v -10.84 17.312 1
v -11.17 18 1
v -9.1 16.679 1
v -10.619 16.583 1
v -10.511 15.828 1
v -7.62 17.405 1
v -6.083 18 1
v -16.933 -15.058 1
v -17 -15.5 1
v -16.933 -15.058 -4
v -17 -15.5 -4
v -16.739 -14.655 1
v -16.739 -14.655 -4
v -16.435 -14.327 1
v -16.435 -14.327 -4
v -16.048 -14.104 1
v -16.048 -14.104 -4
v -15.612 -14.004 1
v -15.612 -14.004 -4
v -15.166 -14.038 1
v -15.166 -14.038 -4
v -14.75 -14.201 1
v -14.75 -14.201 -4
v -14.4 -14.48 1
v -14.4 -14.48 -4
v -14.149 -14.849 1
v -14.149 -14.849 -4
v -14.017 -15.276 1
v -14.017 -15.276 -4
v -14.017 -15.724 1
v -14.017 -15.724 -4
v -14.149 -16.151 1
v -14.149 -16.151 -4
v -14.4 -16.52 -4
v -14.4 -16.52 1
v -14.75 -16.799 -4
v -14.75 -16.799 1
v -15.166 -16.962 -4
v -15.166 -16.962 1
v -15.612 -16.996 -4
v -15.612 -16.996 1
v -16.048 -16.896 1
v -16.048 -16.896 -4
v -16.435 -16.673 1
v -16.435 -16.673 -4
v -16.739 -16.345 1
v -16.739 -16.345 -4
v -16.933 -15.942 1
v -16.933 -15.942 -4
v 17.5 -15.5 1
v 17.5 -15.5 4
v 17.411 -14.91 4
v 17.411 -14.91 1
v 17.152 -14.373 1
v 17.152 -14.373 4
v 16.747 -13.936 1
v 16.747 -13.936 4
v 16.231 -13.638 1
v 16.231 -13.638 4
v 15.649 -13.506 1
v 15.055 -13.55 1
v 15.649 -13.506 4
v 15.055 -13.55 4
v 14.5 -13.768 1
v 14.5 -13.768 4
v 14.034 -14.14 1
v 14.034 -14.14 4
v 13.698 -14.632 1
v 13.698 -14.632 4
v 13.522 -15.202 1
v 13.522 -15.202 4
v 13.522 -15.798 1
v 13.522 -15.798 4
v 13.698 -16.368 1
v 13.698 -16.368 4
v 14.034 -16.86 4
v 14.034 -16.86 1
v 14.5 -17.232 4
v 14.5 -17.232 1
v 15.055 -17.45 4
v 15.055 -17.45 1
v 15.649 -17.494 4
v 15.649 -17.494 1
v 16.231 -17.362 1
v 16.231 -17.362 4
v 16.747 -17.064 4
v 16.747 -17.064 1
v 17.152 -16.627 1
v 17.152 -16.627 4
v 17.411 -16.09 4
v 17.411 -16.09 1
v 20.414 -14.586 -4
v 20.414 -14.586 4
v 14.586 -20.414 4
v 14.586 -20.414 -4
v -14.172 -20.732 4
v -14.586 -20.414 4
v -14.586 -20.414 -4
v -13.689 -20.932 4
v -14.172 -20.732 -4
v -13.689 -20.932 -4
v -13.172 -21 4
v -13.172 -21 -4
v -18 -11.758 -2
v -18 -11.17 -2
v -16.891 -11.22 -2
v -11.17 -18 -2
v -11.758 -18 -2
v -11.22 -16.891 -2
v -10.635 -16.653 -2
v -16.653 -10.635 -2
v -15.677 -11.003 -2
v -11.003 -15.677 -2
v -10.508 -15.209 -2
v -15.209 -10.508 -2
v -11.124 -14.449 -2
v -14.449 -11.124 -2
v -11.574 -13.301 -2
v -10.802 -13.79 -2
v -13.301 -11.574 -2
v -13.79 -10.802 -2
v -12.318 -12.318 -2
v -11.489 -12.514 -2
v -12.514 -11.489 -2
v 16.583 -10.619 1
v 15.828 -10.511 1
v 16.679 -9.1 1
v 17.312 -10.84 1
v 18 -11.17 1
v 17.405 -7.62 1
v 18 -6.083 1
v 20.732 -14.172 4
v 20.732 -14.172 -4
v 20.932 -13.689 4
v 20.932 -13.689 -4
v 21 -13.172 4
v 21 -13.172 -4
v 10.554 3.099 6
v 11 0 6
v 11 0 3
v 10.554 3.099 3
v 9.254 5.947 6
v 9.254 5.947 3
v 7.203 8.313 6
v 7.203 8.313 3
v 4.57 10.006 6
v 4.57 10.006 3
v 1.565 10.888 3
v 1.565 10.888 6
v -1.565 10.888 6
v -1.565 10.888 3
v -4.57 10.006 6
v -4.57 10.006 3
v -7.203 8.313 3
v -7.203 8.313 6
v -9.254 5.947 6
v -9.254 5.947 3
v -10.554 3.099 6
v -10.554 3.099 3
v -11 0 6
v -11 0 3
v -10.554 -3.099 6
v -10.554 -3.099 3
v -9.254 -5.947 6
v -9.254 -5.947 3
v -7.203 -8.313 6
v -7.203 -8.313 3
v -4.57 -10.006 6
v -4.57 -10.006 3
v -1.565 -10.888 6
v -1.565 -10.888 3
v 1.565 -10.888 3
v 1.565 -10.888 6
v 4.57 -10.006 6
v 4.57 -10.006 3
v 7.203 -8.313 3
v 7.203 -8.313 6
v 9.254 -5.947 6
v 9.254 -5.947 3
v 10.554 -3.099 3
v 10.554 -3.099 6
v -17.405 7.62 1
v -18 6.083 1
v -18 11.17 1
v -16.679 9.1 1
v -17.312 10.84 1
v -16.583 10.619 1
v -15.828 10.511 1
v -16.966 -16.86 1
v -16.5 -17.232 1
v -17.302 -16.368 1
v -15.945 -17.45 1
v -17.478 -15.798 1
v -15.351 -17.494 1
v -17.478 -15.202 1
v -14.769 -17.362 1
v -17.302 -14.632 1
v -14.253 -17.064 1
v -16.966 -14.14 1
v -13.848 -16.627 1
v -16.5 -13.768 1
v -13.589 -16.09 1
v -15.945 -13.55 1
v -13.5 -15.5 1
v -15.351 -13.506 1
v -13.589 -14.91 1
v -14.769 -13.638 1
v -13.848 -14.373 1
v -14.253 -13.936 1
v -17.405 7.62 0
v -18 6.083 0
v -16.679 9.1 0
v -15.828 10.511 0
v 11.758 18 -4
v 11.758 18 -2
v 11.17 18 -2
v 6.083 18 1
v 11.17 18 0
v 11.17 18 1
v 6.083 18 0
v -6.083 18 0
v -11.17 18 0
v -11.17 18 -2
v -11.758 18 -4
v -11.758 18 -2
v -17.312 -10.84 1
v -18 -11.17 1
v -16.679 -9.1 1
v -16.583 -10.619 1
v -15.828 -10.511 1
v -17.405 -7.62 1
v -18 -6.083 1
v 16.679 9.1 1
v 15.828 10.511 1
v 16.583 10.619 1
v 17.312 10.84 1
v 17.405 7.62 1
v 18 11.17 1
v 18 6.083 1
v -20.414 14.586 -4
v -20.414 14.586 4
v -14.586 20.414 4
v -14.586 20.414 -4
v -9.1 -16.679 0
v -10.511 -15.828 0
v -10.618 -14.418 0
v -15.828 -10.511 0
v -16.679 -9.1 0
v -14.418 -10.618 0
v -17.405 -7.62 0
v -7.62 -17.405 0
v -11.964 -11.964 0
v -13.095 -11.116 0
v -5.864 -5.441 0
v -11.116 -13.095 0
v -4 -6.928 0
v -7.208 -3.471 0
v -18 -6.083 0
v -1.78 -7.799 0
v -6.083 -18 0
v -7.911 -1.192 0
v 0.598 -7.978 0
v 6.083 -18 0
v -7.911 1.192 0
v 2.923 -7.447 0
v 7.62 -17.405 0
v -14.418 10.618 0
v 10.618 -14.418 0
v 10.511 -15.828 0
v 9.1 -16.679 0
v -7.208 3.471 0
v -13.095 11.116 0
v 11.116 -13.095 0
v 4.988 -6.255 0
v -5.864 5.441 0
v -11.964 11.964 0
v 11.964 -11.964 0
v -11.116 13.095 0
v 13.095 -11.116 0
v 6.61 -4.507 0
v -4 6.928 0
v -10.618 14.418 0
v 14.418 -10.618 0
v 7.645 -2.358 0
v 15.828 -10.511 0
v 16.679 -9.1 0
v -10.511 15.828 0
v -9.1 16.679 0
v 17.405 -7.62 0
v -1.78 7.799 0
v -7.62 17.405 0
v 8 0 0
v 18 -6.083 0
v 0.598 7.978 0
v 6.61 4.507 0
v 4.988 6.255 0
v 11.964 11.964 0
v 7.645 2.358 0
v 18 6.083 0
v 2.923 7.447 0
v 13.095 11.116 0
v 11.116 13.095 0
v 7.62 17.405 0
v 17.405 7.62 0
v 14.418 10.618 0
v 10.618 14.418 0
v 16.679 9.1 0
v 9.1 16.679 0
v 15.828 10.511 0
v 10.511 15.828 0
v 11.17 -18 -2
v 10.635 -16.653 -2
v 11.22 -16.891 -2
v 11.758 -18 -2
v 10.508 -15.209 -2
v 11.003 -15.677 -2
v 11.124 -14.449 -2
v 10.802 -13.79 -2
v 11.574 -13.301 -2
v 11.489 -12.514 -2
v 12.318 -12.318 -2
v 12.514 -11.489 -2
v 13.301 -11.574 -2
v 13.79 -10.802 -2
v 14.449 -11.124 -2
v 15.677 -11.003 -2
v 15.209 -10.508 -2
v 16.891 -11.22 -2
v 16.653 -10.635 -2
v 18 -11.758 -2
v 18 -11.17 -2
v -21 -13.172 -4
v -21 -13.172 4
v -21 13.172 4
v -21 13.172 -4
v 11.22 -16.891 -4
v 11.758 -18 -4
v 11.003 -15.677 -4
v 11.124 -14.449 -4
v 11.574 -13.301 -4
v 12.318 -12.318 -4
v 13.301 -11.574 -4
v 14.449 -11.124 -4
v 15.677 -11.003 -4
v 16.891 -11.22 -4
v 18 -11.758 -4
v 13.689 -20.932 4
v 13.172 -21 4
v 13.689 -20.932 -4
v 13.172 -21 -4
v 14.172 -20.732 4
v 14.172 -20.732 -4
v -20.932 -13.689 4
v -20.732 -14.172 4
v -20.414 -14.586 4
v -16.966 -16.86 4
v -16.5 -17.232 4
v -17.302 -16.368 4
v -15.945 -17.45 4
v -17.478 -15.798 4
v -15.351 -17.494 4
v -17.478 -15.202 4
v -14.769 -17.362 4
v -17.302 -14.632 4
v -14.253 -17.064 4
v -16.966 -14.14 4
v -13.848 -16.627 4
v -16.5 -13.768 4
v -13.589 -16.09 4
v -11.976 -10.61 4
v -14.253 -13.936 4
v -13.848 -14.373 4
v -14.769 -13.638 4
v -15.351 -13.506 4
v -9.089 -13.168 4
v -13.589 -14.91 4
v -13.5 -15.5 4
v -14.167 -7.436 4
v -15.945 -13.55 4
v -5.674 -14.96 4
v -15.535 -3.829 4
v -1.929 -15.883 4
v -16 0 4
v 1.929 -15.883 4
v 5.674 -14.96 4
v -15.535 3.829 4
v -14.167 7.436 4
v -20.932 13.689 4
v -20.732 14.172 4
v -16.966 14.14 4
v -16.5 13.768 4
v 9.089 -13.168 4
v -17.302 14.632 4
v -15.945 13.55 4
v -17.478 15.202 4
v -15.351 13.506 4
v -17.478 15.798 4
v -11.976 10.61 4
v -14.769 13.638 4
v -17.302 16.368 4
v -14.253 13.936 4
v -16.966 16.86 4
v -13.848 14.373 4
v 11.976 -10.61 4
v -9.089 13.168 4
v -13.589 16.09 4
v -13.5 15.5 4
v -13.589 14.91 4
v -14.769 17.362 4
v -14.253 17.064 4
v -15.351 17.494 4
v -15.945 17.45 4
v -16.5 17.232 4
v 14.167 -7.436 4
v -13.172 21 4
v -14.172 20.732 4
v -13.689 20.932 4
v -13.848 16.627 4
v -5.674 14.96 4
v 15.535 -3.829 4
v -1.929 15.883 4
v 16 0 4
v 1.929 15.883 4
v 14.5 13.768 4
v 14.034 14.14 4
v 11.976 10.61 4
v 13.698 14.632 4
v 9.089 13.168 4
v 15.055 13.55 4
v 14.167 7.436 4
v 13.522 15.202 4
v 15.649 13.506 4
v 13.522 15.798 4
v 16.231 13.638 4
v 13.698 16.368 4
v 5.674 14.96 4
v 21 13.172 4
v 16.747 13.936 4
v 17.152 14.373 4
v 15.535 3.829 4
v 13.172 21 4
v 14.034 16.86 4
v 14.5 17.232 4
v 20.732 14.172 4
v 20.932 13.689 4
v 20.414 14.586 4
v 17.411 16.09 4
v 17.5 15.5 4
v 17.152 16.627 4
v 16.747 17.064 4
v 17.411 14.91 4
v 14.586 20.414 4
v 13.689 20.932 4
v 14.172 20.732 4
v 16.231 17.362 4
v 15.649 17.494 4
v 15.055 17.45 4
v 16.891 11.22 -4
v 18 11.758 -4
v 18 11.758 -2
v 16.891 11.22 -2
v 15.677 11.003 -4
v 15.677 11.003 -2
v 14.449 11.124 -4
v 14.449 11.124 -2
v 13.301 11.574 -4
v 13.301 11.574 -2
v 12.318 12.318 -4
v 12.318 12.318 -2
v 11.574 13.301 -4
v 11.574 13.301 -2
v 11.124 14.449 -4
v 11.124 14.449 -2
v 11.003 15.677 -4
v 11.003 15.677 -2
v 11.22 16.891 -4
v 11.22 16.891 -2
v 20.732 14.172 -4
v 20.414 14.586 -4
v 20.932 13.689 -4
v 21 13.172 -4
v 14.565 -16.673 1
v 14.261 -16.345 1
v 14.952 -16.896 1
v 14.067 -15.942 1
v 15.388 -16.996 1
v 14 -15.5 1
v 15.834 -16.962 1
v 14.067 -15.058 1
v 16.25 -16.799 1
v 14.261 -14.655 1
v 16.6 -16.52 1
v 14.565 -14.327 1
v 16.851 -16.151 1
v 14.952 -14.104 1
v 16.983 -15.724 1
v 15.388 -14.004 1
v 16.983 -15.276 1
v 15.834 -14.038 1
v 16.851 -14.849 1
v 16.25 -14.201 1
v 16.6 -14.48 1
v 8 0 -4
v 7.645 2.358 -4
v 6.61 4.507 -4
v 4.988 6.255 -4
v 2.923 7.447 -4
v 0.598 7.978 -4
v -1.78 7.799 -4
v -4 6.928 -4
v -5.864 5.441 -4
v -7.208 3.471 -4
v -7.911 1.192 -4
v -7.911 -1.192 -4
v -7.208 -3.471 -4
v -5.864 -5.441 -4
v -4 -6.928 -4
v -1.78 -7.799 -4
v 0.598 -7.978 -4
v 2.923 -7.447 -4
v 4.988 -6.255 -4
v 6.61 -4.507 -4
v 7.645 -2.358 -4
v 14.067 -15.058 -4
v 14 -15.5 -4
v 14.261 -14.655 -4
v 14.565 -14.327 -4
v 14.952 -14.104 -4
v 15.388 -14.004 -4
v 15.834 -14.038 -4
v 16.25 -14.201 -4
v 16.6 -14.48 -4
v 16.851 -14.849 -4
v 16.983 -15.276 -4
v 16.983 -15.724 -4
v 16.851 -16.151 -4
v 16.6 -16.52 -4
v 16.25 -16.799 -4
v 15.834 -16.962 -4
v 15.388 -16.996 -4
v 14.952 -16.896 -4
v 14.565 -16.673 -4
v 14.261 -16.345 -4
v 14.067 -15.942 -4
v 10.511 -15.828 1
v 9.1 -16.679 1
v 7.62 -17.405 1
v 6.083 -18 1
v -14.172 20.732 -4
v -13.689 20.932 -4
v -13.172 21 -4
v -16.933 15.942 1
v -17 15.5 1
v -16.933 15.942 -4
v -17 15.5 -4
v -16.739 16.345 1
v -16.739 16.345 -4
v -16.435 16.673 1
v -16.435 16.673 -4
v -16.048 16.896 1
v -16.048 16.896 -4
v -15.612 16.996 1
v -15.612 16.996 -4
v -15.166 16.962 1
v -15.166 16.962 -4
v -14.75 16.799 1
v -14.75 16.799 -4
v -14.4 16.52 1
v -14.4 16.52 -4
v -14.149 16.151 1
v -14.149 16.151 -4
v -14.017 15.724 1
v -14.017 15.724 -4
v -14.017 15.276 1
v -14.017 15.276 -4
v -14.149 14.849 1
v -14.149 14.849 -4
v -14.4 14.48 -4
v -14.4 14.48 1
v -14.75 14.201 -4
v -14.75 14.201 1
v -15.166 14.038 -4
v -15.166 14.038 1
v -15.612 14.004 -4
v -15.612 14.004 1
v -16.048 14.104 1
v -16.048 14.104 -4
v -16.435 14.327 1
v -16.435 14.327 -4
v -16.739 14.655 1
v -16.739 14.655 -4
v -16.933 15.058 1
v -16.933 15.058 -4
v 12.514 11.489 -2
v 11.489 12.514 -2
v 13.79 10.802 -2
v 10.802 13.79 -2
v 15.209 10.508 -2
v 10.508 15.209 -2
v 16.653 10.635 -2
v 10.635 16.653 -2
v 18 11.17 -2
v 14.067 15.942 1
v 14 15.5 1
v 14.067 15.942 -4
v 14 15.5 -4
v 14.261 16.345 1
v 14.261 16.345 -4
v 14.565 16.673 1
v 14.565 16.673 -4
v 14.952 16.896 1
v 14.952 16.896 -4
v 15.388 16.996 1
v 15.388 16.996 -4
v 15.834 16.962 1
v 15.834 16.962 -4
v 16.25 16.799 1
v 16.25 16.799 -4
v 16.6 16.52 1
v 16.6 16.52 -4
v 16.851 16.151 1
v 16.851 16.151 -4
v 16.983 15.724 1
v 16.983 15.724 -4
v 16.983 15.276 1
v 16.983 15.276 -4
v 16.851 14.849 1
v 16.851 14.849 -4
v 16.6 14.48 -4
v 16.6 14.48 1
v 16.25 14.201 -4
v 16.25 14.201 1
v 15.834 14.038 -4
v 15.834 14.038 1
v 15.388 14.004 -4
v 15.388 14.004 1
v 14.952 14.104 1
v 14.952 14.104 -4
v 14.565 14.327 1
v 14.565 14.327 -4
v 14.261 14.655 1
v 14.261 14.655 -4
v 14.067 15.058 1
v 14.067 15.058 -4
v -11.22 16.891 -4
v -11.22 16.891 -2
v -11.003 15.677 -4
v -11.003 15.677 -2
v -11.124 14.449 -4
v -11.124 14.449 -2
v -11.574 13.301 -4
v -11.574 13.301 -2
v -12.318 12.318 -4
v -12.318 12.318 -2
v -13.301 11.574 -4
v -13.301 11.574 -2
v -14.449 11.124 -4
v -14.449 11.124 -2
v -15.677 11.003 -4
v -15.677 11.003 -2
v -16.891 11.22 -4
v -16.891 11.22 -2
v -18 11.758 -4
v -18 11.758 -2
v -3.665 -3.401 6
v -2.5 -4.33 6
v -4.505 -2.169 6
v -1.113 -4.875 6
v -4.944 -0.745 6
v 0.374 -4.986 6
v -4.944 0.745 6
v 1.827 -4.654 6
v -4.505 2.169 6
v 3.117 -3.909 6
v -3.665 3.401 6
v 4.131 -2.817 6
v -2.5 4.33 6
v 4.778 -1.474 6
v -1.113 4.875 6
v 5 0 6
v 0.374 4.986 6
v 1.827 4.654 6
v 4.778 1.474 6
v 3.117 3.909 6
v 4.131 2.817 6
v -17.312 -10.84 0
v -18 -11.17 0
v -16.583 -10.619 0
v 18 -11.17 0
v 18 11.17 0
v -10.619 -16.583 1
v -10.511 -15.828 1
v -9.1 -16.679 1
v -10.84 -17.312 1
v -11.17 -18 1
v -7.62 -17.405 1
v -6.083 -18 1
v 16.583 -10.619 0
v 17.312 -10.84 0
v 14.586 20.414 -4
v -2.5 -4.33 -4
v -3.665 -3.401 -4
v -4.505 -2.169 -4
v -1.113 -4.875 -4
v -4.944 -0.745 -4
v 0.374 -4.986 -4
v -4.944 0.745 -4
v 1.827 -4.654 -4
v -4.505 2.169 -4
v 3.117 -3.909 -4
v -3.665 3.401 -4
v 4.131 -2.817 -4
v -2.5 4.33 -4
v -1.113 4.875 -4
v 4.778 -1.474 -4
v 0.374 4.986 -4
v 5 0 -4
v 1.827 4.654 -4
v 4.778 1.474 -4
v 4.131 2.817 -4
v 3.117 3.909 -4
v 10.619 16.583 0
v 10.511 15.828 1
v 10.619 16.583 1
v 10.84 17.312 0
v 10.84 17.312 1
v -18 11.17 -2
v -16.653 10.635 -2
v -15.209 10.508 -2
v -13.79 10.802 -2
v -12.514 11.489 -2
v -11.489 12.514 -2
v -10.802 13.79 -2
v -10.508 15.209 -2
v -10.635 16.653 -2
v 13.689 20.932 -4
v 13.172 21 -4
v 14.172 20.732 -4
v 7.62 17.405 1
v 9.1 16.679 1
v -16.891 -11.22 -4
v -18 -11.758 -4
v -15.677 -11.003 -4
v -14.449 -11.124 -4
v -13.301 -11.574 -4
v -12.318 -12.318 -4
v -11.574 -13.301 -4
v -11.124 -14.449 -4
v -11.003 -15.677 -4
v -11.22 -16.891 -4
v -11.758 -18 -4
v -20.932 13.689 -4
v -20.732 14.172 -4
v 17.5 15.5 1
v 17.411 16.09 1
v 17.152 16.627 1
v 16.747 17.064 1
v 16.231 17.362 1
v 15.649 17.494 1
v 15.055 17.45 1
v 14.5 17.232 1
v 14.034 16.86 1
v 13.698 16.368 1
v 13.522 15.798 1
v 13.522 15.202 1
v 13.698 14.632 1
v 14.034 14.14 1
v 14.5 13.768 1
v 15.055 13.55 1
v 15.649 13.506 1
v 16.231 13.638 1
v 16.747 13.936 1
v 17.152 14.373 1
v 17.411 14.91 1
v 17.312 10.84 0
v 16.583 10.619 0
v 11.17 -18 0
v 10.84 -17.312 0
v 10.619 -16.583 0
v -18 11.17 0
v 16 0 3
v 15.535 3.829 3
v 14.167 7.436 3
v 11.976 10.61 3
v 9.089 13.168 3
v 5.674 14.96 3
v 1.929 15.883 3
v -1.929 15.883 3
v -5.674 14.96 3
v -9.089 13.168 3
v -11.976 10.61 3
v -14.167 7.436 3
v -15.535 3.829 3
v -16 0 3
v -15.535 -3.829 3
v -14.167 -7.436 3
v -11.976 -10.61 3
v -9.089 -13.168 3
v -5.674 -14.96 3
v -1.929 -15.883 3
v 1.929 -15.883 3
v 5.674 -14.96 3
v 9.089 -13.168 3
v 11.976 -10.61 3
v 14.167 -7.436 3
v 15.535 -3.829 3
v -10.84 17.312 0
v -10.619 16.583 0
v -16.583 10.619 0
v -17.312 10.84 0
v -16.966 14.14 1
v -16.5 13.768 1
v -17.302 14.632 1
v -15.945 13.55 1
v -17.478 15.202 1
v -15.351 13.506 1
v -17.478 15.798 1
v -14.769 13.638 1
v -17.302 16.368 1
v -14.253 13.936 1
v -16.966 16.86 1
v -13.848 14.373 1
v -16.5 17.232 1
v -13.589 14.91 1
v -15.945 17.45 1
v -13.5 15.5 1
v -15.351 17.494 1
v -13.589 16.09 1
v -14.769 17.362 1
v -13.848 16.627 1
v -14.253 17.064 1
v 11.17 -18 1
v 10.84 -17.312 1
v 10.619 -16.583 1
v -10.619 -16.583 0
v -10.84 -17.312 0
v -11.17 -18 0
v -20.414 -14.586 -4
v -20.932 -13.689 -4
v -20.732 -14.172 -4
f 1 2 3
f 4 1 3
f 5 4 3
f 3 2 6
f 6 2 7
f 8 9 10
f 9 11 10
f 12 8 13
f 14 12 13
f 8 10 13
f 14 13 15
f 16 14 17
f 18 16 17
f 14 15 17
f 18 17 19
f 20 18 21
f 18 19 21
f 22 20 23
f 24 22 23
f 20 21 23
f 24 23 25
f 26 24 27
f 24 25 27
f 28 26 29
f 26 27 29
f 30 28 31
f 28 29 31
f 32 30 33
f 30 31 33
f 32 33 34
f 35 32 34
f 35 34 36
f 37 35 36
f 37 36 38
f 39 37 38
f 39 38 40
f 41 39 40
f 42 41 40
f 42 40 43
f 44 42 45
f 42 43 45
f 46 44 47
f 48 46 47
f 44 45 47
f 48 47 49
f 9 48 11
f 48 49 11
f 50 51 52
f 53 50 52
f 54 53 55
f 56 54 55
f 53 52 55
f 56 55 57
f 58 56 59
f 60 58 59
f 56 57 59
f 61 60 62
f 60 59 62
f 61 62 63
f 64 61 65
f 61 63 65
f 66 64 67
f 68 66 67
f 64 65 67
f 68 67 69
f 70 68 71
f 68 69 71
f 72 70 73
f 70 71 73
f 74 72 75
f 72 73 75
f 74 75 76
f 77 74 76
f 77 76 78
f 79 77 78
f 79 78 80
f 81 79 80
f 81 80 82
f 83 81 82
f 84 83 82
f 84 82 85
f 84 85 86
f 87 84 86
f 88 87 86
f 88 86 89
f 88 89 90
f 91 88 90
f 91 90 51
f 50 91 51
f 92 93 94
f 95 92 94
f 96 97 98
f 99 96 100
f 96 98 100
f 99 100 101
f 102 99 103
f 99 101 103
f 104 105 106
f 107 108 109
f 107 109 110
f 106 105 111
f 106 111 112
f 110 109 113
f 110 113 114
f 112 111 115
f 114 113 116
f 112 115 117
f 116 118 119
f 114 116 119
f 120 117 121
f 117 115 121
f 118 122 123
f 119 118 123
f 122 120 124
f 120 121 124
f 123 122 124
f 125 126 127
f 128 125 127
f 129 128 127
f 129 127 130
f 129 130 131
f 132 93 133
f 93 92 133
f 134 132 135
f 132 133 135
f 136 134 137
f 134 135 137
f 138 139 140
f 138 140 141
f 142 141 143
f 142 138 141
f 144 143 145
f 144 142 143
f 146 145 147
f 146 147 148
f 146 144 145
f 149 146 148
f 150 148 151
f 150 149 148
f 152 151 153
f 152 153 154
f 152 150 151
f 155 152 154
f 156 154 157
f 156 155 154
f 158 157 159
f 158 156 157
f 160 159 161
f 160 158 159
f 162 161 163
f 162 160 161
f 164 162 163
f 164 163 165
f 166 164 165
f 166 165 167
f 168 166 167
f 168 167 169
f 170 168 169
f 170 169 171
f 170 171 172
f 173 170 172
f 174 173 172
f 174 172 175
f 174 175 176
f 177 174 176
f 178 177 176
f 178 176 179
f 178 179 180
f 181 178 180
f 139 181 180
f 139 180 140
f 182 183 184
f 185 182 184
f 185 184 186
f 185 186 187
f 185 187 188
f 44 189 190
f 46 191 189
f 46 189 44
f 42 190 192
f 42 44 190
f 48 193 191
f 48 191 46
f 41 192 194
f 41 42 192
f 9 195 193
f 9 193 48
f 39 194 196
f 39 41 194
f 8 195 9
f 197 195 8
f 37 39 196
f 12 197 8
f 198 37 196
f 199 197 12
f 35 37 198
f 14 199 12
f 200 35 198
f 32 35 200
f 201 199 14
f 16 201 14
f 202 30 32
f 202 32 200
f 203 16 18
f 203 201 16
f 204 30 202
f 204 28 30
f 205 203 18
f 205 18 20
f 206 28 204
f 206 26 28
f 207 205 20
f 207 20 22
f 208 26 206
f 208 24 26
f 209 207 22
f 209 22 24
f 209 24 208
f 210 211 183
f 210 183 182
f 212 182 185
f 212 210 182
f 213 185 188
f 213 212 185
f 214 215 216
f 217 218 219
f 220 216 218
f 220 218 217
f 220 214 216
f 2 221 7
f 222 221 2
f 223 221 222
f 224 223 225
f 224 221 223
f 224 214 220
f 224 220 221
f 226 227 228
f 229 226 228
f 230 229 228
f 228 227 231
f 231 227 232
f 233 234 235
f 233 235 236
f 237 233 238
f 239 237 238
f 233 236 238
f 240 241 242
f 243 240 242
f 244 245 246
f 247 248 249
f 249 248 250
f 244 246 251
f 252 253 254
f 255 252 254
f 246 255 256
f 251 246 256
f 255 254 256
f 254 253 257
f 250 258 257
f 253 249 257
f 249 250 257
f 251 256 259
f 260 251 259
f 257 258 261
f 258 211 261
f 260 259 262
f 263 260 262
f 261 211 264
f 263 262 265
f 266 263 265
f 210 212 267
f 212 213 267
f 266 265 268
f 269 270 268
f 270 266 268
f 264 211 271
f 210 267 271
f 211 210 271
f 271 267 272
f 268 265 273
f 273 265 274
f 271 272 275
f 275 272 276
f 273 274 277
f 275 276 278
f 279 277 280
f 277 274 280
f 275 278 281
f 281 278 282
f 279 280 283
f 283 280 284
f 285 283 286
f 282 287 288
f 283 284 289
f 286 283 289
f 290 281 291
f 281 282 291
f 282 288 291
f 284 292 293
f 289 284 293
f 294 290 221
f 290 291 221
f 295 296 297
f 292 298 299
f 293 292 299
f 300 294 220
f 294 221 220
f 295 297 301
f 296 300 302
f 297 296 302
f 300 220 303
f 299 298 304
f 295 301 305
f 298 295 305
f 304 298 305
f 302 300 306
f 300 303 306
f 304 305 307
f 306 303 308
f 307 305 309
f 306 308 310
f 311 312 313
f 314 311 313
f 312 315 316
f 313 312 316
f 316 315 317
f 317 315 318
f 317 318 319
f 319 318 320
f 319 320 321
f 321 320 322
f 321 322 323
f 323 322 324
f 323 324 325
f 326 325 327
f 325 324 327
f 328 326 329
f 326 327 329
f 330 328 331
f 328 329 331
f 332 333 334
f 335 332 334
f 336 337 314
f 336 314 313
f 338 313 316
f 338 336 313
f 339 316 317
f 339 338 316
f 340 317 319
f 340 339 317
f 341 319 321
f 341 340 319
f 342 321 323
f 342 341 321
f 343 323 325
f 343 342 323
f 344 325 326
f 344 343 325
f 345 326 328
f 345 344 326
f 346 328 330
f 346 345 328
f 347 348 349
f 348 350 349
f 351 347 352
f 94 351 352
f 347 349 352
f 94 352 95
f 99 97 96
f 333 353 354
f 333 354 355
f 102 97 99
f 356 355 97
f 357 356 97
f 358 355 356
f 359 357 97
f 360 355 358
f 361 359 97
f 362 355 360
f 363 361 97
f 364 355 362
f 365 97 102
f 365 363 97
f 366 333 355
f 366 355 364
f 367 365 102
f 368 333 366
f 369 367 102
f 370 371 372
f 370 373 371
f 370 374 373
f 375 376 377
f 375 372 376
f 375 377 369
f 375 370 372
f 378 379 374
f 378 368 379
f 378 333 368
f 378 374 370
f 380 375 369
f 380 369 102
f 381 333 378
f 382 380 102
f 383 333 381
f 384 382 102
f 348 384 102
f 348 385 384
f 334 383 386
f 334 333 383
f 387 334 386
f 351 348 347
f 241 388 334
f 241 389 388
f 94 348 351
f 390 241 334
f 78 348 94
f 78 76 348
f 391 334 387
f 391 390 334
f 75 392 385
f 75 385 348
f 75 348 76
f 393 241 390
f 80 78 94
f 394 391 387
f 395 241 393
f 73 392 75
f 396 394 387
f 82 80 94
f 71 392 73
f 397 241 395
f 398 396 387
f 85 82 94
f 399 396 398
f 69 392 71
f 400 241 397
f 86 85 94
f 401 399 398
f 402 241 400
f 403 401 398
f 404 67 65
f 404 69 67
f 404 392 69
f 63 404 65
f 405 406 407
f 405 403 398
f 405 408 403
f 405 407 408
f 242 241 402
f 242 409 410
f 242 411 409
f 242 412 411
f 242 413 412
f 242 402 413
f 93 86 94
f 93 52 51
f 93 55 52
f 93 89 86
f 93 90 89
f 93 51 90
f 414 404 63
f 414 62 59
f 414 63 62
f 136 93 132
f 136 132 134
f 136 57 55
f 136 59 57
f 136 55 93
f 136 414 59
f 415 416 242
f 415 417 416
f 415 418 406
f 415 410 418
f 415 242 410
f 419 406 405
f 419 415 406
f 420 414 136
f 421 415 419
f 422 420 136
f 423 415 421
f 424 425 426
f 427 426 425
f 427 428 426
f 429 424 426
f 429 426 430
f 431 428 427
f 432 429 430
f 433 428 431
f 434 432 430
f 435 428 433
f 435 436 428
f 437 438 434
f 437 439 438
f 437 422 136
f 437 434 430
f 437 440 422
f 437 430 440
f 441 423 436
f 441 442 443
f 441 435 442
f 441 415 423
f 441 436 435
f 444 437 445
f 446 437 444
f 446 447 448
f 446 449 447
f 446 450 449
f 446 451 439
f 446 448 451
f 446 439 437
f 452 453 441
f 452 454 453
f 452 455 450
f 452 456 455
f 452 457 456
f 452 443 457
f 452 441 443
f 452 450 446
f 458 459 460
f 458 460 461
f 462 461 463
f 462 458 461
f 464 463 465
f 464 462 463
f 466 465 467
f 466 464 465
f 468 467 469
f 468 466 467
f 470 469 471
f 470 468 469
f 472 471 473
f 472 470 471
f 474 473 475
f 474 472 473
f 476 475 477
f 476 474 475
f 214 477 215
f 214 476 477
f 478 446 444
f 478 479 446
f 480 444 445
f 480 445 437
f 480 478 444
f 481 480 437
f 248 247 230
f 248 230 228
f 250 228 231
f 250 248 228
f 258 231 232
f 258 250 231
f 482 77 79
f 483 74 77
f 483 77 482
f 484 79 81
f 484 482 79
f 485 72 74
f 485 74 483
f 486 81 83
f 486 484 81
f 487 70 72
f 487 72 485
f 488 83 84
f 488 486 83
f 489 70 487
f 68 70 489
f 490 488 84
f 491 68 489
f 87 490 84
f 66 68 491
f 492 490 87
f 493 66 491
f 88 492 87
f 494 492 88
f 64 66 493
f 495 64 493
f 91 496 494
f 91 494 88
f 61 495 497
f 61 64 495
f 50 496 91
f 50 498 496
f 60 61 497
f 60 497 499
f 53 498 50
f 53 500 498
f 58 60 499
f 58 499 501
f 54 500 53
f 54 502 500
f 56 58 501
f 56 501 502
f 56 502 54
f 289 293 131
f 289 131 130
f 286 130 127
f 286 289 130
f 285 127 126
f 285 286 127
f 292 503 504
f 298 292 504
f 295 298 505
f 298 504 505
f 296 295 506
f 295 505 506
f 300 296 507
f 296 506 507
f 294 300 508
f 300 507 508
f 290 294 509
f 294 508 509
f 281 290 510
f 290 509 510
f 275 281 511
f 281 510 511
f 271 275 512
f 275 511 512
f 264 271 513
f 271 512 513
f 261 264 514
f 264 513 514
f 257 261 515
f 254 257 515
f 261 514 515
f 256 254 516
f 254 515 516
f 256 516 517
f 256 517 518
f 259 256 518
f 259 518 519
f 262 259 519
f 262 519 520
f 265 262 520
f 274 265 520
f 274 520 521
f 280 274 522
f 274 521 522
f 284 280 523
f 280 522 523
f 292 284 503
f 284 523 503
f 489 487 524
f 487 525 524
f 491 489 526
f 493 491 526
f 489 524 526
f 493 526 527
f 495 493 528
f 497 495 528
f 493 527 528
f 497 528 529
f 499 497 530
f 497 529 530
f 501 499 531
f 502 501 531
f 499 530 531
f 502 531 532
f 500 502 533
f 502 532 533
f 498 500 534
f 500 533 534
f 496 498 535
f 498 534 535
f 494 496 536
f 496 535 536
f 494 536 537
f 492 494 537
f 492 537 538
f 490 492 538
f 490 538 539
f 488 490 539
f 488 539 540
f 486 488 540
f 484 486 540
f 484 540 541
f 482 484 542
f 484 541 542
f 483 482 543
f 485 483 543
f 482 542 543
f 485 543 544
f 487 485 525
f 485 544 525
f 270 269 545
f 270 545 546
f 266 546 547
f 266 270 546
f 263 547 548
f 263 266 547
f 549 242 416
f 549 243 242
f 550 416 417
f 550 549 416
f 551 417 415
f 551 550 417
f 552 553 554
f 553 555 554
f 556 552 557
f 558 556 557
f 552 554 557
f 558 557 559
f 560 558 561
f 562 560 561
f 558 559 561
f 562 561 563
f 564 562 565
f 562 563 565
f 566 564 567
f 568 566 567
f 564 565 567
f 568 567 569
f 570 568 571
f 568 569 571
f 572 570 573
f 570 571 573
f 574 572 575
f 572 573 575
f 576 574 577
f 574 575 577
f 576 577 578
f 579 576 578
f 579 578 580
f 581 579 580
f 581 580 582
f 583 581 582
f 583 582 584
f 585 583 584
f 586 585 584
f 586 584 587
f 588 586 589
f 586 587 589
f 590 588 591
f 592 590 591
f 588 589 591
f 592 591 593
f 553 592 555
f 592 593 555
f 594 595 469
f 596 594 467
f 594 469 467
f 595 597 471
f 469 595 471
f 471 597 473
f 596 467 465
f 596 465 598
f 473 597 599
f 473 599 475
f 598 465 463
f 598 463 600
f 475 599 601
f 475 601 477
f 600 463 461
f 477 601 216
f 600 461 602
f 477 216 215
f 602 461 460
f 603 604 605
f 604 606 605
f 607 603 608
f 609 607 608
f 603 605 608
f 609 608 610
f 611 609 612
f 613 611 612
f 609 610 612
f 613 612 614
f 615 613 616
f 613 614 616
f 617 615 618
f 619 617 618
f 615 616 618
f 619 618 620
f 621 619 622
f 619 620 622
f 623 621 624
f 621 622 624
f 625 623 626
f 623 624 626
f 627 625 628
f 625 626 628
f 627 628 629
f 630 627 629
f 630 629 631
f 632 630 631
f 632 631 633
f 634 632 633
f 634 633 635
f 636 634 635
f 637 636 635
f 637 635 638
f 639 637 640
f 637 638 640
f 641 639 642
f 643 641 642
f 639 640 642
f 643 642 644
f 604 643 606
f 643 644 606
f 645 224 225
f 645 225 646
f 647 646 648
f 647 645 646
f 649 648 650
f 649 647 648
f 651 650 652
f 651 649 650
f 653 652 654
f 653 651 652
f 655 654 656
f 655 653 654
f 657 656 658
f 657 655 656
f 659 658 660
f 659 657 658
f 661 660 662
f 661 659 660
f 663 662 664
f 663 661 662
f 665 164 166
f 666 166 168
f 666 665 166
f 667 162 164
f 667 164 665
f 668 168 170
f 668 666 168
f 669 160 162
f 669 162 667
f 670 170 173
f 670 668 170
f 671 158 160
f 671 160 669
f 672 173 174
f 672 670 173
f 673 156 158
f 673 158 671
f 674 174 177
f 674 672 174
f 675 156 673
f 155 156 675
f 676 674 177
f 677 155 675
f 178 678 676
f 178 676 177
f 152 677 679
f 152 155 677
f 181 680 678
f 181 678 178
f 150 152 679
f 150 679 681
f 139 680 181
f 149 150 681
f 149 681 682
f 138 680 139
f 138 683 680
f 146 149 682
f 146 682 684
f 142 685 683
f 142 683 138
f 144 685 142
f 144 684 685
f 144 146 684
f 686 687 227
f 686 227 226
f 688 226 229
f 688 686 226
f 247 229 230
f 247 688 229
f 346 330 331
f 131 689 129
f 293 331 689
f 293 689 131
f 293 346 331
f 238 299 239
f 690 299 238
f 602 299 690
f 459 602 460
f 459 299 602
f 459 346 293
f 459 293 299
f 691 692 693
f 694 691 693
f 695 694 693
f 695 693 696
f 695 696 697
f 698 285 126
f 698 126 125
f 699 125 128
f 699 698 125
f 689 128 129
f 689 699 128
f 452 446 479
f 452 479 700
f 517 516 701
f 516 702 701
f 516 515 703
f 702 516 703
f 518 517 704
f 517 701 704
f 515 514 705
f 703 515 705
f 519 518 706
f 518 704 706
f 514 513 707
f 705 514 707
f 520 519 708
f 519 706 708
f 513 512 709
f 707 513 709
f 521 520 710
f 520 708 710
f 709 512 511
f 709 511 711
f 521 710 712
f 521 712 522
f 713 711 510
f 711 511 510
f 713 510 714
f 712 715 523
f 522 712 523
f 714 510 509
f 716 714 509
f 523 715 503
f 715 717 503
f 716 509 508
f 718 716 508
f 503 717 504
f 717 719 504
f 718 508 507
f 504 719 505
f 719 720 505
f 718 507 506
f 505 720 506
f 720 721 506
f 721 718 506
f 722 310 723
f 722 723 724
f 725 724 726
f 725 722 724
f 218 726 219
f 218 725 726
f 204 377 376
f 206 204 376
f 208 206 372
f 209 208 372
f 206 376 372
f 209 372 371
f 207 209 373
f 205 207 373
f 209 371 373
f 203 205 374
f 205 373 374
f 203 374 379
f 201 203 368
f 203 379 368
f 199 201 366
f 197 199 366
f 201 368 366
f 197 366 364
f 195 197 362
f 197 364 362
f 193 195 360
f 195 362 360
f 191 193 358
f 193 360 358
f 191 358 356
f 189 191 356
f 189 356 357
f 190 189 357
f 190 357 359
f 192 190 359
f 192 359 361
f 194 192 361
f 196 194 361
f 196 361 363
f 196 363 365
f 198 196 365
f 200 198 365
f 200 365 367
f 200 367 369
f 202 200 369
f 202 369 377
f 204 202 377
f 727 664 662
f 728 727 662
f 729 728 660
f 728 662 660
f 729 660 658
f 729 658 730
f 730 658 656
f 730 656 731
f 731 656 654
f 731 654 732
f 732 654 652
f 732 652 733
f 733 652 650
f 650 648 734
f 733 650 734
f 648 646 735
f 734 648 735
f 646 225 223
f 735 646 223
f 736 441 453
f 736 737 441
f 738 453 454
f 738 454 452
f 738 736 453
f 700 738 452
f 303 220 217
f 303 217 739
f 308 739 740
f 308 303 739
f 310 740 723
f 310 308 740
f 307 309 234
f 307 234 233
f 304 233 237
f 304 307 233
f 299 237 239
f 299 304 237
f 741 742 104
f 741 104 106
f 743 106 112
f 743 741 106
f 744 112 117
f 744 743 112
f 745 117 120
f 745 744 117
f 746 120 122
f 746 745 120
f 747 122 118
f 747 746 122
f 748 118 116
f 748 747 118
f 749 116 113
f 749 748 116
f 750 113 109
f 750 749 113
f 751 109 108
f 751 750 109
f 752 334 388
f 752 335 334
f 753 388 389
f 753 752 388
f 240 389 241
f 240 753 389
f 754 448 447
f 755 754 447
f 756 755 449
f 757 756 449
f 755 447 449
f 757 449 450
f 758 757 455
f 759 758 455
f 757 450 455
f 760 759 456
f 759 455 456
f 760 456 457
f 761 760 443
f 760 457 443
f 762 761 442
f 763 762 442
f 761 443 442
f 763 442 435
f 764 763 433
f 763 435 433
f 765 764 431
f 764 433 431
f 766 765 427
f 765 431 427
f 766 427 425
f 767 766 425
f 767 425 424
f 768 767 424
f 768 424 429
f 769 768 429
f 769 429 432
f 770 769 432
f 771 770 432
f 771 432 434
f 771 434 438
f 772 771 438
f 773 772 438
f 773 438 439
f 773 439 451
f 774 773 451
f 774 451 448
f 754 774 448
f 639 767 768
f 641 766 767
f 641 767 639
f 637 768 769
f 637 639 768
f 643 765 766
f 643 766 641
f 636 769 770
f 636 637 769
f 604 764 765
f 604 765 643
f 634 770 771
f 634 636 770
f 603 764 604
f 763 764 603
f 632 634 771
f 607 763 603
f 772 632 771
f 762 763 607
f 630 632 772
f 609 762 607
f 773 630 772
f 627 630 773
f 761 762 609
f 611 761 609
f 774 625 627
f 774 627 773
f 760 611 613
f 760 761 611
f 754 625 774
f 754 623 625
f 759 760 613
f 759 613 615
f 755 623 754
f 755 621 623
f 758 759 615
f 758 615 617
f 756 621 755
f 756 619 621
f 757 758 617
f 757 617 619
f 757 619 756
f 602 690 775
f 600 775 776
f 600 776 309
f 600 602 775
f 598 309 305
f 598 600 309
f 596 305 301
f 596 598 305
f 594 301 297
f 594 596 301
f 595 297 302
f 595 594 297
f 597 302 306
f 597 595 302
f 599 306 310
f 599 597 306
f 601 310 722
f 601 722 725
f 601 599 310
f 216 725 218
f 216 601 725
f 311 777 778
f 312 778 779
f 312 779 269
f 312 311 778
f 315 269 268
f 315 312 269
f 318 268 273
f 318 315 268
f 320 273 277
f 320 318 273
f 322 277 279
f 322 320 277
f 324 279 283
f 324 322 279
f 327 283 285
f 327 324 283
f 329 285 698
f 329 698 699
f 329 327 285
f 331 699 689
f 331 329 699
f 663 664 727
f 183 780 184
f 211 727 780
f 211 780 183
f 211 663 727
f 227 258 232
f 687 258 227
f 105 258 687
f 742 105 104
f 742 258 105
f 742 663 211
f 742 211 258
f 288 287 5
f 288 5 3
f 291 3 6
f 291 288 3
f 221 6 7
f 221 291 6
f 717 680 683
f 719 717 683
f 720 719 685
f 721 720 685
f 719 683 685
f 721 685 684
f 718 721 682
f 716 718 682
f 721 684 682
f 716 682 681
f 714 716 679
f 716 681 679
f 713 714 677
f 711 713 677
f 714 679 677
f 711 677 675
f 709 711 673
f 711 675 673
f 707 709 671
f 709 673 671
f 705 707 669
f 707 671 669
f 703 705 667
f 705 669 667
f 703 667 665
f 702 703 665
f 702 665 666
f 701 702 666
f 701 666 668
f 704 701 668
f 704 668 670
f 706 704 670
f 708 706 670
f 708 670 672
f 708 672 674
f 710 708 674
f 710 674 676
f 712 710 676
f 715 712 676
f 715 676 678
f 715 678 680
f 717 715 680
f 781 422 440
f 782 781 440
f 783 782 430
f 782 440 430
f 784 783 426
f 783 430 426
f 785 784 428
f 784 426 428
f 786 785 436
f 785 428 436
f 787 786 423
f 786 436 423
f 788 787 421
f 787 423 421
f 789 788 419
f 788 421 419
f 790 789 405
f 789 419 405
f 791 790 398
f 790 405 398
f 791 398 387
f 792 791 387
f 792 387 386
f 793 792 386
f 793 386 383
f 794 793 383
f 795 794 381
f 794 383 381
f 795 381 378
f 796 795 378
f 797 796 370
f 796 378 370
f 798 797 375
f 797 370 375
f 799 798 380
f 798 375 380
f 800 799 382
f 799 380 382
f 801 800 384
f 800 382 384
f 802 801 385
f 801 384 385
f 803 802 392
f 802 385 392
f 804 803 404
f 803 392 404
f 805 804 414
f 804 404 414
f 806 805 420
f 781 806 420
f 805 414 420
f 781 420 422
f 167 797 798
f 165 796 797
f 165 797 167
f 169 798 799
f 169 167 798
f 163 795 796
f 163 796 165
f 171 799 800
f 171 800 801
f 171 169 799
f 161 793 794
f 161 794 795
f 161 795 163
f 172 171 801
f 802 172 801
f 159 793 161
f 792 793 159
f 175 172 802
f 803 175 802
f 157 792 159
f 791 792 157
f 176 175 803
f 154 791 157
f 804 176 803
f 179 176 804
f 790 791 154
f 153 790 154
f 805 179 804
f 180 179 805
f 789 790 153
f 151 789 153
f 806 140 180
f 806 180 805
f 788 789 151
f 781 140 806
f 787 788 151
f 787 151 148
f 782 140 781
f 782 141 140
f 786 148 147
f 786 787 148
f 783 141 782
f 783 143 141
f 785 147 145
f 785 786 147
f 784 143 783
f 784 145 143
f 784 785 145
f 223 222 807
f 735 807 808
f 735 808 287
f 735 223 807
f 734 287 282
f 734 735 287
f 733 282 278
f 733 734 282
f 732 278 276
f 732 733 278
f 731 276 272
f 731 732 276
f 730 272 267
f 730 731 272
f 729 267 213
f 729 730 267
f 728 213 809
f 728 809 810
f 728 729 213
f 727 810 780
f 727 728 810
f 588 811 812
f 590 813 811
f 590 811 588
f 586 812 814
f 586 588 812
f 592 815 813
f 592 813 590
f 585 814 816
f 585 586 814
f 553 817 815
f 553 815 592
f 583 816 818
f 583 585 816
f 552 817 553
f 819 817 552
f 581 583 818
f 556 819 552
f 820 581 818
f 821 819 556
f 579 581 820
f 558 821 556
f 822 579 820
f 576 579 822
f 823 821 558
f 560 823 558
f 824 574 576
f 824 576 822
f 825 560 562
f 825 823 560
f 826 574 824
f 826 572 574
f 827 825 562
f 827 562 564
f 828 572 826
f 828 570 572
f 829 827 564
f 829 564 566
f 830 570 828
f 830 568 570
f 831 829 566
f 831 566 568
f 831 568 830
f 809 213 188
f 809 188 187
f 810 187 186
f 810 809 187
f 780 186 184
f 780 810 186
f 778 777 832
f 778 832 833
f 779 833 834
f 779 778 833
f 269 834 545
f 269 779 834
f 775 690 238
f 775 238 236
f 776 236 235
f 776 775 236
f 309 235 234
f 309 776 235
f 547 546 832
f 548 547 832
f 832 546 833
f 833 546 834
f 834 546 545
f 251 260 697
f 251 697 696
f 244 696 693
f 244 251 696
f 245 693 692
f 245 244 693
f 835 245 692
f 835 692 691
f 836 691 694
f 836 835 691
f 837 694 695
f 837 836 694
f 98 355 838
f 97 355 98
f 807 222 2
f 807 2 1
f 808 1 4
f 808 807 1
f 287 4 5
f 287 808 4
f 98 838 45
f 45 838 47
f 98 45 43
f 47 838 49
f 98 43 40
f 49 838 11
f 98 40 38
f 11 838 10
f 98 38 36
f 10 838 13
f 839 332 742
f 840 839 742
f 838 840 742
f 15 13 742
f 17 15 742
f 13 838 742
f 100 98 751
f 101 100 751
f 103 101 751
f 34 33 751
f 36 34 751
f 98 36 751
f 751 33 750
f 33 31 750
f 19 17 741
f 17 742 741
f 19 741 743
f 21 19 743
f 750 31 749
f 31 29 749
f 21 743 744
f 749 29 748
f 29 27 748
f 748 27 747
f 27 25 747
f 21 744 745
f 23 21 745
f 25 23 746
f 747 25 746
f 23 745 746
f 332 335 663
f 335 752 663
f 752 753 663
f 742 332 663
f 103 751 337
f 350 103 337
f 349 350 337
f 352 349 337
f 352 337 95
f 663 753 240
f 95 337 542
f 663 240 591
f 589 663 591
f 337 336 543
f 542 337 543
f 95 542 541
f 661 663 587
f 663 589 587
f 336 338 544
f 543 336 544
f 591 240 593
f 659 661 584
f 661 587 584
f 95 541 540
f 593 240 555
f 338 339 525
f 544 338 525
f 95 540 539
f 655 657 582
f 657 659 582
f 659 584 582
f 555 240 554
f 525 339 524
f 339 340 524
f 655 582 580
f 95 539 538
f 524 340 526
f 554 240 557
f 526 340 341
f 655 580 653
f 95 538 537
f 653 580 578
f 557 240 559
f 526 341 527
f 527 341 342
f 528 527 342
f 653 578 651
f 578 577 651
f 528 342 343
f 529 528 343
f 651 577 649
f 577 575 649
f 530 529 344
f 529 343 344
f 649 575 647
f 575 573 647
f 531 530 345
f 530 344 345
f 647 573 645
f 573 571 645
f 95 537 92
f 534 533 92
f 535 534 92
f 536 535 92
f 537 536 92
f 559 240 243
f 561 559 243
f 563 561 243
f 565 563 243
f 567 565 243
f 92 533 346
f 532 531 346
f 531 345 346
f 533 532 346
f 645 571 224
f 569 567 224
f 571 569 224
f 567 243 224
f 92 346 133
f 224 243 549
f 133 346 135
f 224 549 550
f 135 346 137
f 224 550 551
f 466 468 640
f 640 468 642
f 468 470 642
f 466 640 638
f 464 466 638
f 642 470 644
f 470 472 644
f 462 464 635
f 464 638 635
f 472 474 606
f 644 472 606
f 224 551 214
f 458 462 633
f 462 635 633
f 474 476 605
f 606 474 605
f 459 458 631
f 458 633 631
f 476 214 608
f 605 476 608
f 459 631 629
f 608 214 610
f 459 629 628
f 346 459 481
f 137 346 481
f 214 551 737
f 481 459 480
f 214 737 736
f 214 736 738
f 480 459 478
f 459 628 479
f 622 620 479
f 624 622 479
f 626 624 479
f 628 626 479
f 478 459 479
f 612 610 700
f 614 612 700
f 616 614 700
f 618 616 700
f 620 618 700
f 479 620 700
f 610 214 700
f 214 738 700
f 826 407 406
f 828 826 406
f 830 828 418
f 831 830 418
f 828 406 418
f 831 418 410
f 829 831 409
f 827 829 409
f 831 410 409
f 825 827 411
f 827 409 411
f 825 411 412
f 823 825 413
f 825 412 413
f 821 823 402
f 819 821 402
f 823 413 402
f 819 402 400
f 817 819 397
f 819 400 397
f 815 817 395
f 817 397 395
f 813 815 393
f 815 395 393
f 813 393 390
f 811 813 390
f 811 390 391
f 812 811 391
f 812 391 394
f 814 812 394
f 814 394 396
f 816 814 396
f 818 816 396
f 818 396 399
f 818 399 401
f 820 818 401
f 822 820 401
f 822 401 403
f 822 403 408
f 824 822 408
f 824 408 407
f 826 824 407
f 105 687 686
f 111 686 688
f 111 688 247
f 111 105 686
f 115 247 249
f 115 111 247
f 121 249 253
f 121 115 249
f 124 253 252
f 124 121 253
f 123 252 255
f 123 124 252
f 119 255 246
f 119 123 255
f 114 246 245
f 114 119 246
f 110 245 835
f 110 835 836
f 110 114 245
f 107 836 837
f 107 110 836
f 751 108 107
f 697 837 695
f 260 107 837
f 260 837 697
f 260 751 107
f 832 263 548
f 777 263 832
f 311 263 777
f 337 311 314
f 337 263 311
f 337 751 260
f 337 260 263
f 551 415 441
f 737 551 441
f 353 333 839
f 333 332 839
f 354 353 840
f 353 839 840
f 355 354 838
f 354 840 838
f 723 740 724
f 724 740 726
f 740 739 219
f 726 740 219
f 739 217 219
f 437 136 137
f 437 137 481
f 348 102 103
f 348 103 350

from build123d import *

# Parameters (mm, degrees)
SKETCH1_W                               = 42
SKETCH1_H                               = 42
BOSS_EXTRUDE1_DEPTH                     = 4
CUT_EXTRUDE1_REACH                      = 32.757
SKETCH3_R                               = 16
SKETCH3_R_2                             = 11
CUT_EXTRUDE2_DEPTH                      = 1
BOSS_EXTRUDE2_START                     = 2
SKETCH4_R                               = 11
BOSS_EXTRUDE2_DEPTH                     = 2
CUT_EXTRUDE3_REACH                      = 33.337
SKETCH5_R                               = 5
CBORE_FOR_M5_HEX_HEAD_BOLT2_D           = 3
CBORE_FOR_M5_HEX_HEAD_BOLT2_DEPTH       = 10
CBORE_FOR_M5_HEX_HEAD_BOLT2_CBORE_D     = 4
CBORE_FOR_M5_HEX_HEAD_BOLT2_CBORE_DEPTH = 3
CBORE_FOR_M5_HEX_HEAD_BOLT2_TIP         = 0.901290929
SHELL1_START                            = -4
SHELL1_OUTLINE_R                        = 8
SHELL1_DEPTH                            = 4
SHELL1_2_DEPTH                          = 2
SHELL1_3_DEPTH                          = 1
FILLET1_R                               = 2


# Read off the part's stored shape, not the designer's step: Shell1
with BuildPart() as part:
    # Sketch1 → Boss-Extrude1 (new, symmetric)
    with BuildSketch(Plane.XY):
        Rectangle(SKETCH1_W, SKETCH1_H)
    extrude(amount=BOSS_EXTRUDE1_DEPTH, both=True)

    # Sketch2 → Cut-Extrude1 (cut, up to next)
    with BuildSketch(Plane.XY.offset(4), mode=Mode.PRIVATE) as cut_extrude1_sk1:
        Polygon((-21, 21), (-21, 14), (-14, 21), align=None)
    cut_extrude1_tool1 = extrude(cut_extrude1_sk1.sketch, amount=-CUT_EXTRUDE1_REACH, mode=Mode.PRIVATE) & part.part
    # Sketch2 → Cut-Extrude1 (cut, up to next)
    with BuildSketch(Plane.XY.offset(4), mode=Mode.PRIVATE) as cut_extrude1_sk2:
        Polygon((21, 14), (14, 21), (21, 21), align=None)
    cut_extrude1_tool2 = extrude(cut_extrude1_sk2.sketch, amount=-CUT_EXTRUDE1_REACH, mode=Mode.PRIVATE) & part.part
    # Sketch2 → Cut-Extrude1 (cut, up to next)
    with BuildSketch(Plane.XY.offset(4), mode=Mode.PRIVATE) as cut_extrude1_sk3:
        Polygon((21, -21), (21, -14), (14, -21), align=None)
    cut_extrude1_tool3 = extrude(cut_extrude1_sk3.sketch, amount=-CUT_EXTRUDE1_REACH, mode=Mode.PRIVATE) & part.part
    # Sketch2 → Cut-Extrude1 (cut, up to next)
    with BuildSketch(Plane.XY.offset(4), mode=Mode.PRIVATE) as cut_extrude1_sk4:
        Polygon((-21, -14), (-14, -21), (-21, -21), align=None)
    cut_extrude1_tool4 = extrude(cut_extrude1_sk4.sketch, amount=-CUT_EXTRUDE1_REACH, mode=Mode.PRIVATE) & part.part
    add(cut_extrude1_tool1.solids().sort_by_distance((-18.666667, 18.666667, 4))[0], mode=Mode.SUBTRACT)
    add(cut_extrude1_tool2.solids().sort_by_distance((18.666667, 18.666667, 4))[0], mode=Mode.SUBTRACT)
    add(cut_extrude1_tool3.solids().sort_by_distance((18.666667, -18.666667, 4))[0], mode=Mode.SUBTRACT)
    add(cut_extrude1_tool4.solids().sort_by_distance((-18.666667, -18.666667, 4))[0], mode=Mode.SUBTRACT)

    # Sketch3 → Cut-Extrude2 (cut)
    with BuildSketch(Plane.XY.offset(4)):
        Circle(SKETCH3_R)
        Circle(SKETCH3_R_2, mode=Mode.SUBTRACT)
    extrude(amount=-CUT_EXTRUDE2_DEPTH, mode=Mode.SUBTRACT)

    # Sketch4 → Boss-Extrude2 (add)
    with BuildSketch(Plane.XY.offset(4).offset(BOSS_EXTRUDE2_START)):
        Circle(SKETCH4_R)
    extrude(amount=-BOSS_EXTRUDE2_DEPTH)

    # Sketch5 → Cut-Extrude3 (cut, up to next)
    with BuildSketch(Plane.XY.offset(6), mode=Mode.PRIVATE) as cut_extrude3_sk1:
        Circle(SKETCH5_R)
    cut_extrude3_tool1 = extrude(cut_extrude3_sk1.sketch, amount=-CUT_EXTRUDE3_REACH, mode=Mode.PRIVATE) & part.part
    add(cut_extrude3_tool1.solids().sort_by_distance((0, 0, 6))[0], mode=Mode.SUBTRACT)

    # CBORE for M5 Hex Head Bolt2
    with Locations(Plane.XY.offset(4)):
        with Locations((-15.5, 15.5), (15.5, 15.5), (15.5, -15.5), (-15.5, -15.5)):
            CounterBoreHole(CBORE_FOR_M5_HEX_HEAD_BOLT2_D / 2, CBORE_FOR_M5_HEX_HEAD_BOLT2_CBORE_D / 2, CBORE_FOR_M5_HEX_HEAD_BOLT2_CBORE_DEPTH, depth=CBORE_FOR_M5_HEX_HEAD_BOLT2_DEPTH)
            with Locations((0, 0, -(CBORE_FOR_M5_HEX_HEAD_BOLT2_DEPTH + CBORE_FOR_M5_HEX_HEAD_BOLT2_TIP / 2))):  # 118° drill point
                Cone(0, CBORE_FOR_M5_HEX_HEAD_BOLT2_D / 2, CBORE_FOR_M5_HEX_HEAD_BOLT2_TIP, mode=Mode.SUBTRACT)

    # Shell1 outline → Shell1 (cut)
    with BuildSketch(Plane.XY.offset(SHELL1_START)):
        with BuildLine():
            ThreePointArc((-18, -11.169872981), (-11.964466094, -11.964466094), (-11.169872981, -18))
            Line((-11.169872981, -18), (11.169872981, -18))
            ThreePointArc((11.169872981, -18), (11.964466094, -11.964466094), (18, -11.169872981))
            Line((18, -11.169872981), (18, 11.169872981))
            ThreePointArc((18, 11.169872981), (11.964466094, 11.964466094), (11.169872981, 18))
            Line((11.169872981, 18), (-11.169872981, 18))
            ThreePointArc((-11.169872981, 18), (-11.964466094, 11.964466094), (-18, 11.169872981))
            Line((-18, 11.169872981), (-18, -11.169872981))
        make_face()
        Circle(SHELL1_OUTLINE_R, mode=Mode.SUBTRACT)
    extrude(amount=SHELL1_DEPTH, mode=Mode.SUBTRACT)

    # Shell1 2 outline → Shell1 2 (cut)
    with BuildSketch(Plane.XY.offset(SHELL1_START)):
        with BuildLine():
            Line((-18, -11.169872981), (-18, -11.758342613))
            ThreePointArc((-18, -11.758342613), (-12.318019485, -12.318019485), (-11.758342613, -18))
            Line((-11.758342613, -18), (-11.169872981, -18))
            ThreePointArc((-11.169872981, -18), (-11.964466094, -11.964466094), (-18, -11.169872981))
        make_face()
        with BuildLine():
            Line((-18, 11.758342613), (-18, 11.169872981))
            ThreePointArc((-18, 11.169872981), (-11.964466094, 11.964466094), (-11.169872981, 18))
            Line((-11.169872981, 18), (-11.758342613, 18))
            ThreePointArc((-11.758342613, 18), (-12.318019485, 12.318019485), (-18, 11.758342613))
        make_face()
        with BuildLine():
            ThreePointArc((18, -11.169872981), (11.964466094, -11.964466094), (11.169872981, -18))
            Line((11.169872981, -18), (11.758342613, -18))
            ThreePointArc((11.758342613, -18), (12.318019485, -12.318019485), (18, -11.758342613))
            Line((18, -11.758342613), (18, -11.169872981))
        make_face()
        with BuildLine():
            Line((11.758342613, 18), (11.169872981, 18))
            ThreePointArc((11.169872981, 18), (11.964466094, 11.964466094), (18, 11.169872981))
            Line((18, 11.169872981), (18, 11.758342613))
            ThreePointArc((18, 11.758342613), (12.318019485, 12.318019485), (11.758342613, 18))
        make_face()
    extrude(amount=SHELL1_2_DEPTH, mode=Mode.SUBTRACT)

    # Shell1 3 outline → Shell1 3 (cut)
    with BuildSketch(Plane.XY):
        with BuildLine():
            Line((-18, -6.08276253), (-18, -11.169872981))
            ThreePointArc((-18, -11.169872981), (-16.951868237, -10.715433288), (-15.827943399, -10.510766278))
            ThreePointArc((-15.827943399, -10.510766278), (-17.058260256, -8.367541876), (-18, -6.08276253))
        make_face()
        with BuildLine():
            ThreePointArc((-10.510766278, -15.827943399), (-10.715433288, -16.951868237), (-11.169872981, -18))
            Line((-11.169872981, -18), (-6.08276253, -18))
            ThreePointArc((-6.08276253, -18), (-8.367541876, -17.058260256), (-10.510766278, -15.827943399))
        make_face()
        with BuildLine():
            Line((-18, 11.169872981), (-18, 6.08276253))
            ThreePointArc((-18, 6.08276253), (-17.058260256, 8.367541876), (-15.827943399, 10.510766279))
            ThreePointArc((-15.827943399, 10.510766279), (-16.951868237, 10.715433288), (-18, 11.169872981))
        make_face()
        with BuildLine():
            ThreePointArc((10.510766279, -15.827943399), (8.367541876, -17.058260256), (6.08276253, -18))
            Line((6.08276253, -18), (11.169872981, -18))
            ThreePointArc((11.169872981, -18), (10.715433288, -16.951868237), (10.510766279, -15.827943399))
        make_face()
        with BuildLine():
            ThreePointArc((-11.169872981, 18), (-10.715433288, 16.951868237), (-10.510766278, 15.827943399))
            ThreePointArc((-10.510766278, 15.827943399), (-8.367541876, 17.058260256), (-6.08276253, 18))
            Line((-6.08276253, 18), (-11.169872981, 18))
        make_face()
        with BuildLine():
            ThreePointArc((18, -6.08276253), (17.058260256, -8.367541876), (15.827943399, -10.510766279))
            ThreePointArc((15.827943399, -10.510766279), (16.951868237, -10.715433288), (18, -11.169872981))
            Line((18, -11.169872981), (18, -6.08276253))
        make_face()
        with BuildLine():
            Line((11.169872981, 18), (6.08276253, 18))
            ThreePointArc((6.08276253, 18), (8.367541876, 17.058260256), (10.510766279, 15.827943399))
            ThreePointArc((10.510766279, 15.827943399), (10.715433288, 16.951868237), (11.169872981, 18))
        make_face()
        with BuildLine():
            ThreePointArc((15.827943399, 10.510766279), (17.058260256, 8.367541876), (18, 6.08276253))
            Line((18, 6.08276253), (18, 11.169872981))
            ThreePointArc((18, 11.169872981), (16.951868237, 10.715433288), (15.827943399, 10.510766279))
        make_face()
    extrude(amount=SHELL1_3_DEPTH, mode=Mode.SUBTRACT)

    # Fillet1
    fillet1_edges = [part.edges().sort_by_distance(p)[0] for p in [
        (-21, -14, 0),
        (-14, -21, 0),
        (14, -21, 0),
        (21, -14, 0),
        (21, 14, 0),
        (14, 21, 0),
        (-14, 21, 0),
        (-21, 14, 0),
    ]]
    fillet(fillet1_edges, radius=FILLET1_R)


solid = part.part
